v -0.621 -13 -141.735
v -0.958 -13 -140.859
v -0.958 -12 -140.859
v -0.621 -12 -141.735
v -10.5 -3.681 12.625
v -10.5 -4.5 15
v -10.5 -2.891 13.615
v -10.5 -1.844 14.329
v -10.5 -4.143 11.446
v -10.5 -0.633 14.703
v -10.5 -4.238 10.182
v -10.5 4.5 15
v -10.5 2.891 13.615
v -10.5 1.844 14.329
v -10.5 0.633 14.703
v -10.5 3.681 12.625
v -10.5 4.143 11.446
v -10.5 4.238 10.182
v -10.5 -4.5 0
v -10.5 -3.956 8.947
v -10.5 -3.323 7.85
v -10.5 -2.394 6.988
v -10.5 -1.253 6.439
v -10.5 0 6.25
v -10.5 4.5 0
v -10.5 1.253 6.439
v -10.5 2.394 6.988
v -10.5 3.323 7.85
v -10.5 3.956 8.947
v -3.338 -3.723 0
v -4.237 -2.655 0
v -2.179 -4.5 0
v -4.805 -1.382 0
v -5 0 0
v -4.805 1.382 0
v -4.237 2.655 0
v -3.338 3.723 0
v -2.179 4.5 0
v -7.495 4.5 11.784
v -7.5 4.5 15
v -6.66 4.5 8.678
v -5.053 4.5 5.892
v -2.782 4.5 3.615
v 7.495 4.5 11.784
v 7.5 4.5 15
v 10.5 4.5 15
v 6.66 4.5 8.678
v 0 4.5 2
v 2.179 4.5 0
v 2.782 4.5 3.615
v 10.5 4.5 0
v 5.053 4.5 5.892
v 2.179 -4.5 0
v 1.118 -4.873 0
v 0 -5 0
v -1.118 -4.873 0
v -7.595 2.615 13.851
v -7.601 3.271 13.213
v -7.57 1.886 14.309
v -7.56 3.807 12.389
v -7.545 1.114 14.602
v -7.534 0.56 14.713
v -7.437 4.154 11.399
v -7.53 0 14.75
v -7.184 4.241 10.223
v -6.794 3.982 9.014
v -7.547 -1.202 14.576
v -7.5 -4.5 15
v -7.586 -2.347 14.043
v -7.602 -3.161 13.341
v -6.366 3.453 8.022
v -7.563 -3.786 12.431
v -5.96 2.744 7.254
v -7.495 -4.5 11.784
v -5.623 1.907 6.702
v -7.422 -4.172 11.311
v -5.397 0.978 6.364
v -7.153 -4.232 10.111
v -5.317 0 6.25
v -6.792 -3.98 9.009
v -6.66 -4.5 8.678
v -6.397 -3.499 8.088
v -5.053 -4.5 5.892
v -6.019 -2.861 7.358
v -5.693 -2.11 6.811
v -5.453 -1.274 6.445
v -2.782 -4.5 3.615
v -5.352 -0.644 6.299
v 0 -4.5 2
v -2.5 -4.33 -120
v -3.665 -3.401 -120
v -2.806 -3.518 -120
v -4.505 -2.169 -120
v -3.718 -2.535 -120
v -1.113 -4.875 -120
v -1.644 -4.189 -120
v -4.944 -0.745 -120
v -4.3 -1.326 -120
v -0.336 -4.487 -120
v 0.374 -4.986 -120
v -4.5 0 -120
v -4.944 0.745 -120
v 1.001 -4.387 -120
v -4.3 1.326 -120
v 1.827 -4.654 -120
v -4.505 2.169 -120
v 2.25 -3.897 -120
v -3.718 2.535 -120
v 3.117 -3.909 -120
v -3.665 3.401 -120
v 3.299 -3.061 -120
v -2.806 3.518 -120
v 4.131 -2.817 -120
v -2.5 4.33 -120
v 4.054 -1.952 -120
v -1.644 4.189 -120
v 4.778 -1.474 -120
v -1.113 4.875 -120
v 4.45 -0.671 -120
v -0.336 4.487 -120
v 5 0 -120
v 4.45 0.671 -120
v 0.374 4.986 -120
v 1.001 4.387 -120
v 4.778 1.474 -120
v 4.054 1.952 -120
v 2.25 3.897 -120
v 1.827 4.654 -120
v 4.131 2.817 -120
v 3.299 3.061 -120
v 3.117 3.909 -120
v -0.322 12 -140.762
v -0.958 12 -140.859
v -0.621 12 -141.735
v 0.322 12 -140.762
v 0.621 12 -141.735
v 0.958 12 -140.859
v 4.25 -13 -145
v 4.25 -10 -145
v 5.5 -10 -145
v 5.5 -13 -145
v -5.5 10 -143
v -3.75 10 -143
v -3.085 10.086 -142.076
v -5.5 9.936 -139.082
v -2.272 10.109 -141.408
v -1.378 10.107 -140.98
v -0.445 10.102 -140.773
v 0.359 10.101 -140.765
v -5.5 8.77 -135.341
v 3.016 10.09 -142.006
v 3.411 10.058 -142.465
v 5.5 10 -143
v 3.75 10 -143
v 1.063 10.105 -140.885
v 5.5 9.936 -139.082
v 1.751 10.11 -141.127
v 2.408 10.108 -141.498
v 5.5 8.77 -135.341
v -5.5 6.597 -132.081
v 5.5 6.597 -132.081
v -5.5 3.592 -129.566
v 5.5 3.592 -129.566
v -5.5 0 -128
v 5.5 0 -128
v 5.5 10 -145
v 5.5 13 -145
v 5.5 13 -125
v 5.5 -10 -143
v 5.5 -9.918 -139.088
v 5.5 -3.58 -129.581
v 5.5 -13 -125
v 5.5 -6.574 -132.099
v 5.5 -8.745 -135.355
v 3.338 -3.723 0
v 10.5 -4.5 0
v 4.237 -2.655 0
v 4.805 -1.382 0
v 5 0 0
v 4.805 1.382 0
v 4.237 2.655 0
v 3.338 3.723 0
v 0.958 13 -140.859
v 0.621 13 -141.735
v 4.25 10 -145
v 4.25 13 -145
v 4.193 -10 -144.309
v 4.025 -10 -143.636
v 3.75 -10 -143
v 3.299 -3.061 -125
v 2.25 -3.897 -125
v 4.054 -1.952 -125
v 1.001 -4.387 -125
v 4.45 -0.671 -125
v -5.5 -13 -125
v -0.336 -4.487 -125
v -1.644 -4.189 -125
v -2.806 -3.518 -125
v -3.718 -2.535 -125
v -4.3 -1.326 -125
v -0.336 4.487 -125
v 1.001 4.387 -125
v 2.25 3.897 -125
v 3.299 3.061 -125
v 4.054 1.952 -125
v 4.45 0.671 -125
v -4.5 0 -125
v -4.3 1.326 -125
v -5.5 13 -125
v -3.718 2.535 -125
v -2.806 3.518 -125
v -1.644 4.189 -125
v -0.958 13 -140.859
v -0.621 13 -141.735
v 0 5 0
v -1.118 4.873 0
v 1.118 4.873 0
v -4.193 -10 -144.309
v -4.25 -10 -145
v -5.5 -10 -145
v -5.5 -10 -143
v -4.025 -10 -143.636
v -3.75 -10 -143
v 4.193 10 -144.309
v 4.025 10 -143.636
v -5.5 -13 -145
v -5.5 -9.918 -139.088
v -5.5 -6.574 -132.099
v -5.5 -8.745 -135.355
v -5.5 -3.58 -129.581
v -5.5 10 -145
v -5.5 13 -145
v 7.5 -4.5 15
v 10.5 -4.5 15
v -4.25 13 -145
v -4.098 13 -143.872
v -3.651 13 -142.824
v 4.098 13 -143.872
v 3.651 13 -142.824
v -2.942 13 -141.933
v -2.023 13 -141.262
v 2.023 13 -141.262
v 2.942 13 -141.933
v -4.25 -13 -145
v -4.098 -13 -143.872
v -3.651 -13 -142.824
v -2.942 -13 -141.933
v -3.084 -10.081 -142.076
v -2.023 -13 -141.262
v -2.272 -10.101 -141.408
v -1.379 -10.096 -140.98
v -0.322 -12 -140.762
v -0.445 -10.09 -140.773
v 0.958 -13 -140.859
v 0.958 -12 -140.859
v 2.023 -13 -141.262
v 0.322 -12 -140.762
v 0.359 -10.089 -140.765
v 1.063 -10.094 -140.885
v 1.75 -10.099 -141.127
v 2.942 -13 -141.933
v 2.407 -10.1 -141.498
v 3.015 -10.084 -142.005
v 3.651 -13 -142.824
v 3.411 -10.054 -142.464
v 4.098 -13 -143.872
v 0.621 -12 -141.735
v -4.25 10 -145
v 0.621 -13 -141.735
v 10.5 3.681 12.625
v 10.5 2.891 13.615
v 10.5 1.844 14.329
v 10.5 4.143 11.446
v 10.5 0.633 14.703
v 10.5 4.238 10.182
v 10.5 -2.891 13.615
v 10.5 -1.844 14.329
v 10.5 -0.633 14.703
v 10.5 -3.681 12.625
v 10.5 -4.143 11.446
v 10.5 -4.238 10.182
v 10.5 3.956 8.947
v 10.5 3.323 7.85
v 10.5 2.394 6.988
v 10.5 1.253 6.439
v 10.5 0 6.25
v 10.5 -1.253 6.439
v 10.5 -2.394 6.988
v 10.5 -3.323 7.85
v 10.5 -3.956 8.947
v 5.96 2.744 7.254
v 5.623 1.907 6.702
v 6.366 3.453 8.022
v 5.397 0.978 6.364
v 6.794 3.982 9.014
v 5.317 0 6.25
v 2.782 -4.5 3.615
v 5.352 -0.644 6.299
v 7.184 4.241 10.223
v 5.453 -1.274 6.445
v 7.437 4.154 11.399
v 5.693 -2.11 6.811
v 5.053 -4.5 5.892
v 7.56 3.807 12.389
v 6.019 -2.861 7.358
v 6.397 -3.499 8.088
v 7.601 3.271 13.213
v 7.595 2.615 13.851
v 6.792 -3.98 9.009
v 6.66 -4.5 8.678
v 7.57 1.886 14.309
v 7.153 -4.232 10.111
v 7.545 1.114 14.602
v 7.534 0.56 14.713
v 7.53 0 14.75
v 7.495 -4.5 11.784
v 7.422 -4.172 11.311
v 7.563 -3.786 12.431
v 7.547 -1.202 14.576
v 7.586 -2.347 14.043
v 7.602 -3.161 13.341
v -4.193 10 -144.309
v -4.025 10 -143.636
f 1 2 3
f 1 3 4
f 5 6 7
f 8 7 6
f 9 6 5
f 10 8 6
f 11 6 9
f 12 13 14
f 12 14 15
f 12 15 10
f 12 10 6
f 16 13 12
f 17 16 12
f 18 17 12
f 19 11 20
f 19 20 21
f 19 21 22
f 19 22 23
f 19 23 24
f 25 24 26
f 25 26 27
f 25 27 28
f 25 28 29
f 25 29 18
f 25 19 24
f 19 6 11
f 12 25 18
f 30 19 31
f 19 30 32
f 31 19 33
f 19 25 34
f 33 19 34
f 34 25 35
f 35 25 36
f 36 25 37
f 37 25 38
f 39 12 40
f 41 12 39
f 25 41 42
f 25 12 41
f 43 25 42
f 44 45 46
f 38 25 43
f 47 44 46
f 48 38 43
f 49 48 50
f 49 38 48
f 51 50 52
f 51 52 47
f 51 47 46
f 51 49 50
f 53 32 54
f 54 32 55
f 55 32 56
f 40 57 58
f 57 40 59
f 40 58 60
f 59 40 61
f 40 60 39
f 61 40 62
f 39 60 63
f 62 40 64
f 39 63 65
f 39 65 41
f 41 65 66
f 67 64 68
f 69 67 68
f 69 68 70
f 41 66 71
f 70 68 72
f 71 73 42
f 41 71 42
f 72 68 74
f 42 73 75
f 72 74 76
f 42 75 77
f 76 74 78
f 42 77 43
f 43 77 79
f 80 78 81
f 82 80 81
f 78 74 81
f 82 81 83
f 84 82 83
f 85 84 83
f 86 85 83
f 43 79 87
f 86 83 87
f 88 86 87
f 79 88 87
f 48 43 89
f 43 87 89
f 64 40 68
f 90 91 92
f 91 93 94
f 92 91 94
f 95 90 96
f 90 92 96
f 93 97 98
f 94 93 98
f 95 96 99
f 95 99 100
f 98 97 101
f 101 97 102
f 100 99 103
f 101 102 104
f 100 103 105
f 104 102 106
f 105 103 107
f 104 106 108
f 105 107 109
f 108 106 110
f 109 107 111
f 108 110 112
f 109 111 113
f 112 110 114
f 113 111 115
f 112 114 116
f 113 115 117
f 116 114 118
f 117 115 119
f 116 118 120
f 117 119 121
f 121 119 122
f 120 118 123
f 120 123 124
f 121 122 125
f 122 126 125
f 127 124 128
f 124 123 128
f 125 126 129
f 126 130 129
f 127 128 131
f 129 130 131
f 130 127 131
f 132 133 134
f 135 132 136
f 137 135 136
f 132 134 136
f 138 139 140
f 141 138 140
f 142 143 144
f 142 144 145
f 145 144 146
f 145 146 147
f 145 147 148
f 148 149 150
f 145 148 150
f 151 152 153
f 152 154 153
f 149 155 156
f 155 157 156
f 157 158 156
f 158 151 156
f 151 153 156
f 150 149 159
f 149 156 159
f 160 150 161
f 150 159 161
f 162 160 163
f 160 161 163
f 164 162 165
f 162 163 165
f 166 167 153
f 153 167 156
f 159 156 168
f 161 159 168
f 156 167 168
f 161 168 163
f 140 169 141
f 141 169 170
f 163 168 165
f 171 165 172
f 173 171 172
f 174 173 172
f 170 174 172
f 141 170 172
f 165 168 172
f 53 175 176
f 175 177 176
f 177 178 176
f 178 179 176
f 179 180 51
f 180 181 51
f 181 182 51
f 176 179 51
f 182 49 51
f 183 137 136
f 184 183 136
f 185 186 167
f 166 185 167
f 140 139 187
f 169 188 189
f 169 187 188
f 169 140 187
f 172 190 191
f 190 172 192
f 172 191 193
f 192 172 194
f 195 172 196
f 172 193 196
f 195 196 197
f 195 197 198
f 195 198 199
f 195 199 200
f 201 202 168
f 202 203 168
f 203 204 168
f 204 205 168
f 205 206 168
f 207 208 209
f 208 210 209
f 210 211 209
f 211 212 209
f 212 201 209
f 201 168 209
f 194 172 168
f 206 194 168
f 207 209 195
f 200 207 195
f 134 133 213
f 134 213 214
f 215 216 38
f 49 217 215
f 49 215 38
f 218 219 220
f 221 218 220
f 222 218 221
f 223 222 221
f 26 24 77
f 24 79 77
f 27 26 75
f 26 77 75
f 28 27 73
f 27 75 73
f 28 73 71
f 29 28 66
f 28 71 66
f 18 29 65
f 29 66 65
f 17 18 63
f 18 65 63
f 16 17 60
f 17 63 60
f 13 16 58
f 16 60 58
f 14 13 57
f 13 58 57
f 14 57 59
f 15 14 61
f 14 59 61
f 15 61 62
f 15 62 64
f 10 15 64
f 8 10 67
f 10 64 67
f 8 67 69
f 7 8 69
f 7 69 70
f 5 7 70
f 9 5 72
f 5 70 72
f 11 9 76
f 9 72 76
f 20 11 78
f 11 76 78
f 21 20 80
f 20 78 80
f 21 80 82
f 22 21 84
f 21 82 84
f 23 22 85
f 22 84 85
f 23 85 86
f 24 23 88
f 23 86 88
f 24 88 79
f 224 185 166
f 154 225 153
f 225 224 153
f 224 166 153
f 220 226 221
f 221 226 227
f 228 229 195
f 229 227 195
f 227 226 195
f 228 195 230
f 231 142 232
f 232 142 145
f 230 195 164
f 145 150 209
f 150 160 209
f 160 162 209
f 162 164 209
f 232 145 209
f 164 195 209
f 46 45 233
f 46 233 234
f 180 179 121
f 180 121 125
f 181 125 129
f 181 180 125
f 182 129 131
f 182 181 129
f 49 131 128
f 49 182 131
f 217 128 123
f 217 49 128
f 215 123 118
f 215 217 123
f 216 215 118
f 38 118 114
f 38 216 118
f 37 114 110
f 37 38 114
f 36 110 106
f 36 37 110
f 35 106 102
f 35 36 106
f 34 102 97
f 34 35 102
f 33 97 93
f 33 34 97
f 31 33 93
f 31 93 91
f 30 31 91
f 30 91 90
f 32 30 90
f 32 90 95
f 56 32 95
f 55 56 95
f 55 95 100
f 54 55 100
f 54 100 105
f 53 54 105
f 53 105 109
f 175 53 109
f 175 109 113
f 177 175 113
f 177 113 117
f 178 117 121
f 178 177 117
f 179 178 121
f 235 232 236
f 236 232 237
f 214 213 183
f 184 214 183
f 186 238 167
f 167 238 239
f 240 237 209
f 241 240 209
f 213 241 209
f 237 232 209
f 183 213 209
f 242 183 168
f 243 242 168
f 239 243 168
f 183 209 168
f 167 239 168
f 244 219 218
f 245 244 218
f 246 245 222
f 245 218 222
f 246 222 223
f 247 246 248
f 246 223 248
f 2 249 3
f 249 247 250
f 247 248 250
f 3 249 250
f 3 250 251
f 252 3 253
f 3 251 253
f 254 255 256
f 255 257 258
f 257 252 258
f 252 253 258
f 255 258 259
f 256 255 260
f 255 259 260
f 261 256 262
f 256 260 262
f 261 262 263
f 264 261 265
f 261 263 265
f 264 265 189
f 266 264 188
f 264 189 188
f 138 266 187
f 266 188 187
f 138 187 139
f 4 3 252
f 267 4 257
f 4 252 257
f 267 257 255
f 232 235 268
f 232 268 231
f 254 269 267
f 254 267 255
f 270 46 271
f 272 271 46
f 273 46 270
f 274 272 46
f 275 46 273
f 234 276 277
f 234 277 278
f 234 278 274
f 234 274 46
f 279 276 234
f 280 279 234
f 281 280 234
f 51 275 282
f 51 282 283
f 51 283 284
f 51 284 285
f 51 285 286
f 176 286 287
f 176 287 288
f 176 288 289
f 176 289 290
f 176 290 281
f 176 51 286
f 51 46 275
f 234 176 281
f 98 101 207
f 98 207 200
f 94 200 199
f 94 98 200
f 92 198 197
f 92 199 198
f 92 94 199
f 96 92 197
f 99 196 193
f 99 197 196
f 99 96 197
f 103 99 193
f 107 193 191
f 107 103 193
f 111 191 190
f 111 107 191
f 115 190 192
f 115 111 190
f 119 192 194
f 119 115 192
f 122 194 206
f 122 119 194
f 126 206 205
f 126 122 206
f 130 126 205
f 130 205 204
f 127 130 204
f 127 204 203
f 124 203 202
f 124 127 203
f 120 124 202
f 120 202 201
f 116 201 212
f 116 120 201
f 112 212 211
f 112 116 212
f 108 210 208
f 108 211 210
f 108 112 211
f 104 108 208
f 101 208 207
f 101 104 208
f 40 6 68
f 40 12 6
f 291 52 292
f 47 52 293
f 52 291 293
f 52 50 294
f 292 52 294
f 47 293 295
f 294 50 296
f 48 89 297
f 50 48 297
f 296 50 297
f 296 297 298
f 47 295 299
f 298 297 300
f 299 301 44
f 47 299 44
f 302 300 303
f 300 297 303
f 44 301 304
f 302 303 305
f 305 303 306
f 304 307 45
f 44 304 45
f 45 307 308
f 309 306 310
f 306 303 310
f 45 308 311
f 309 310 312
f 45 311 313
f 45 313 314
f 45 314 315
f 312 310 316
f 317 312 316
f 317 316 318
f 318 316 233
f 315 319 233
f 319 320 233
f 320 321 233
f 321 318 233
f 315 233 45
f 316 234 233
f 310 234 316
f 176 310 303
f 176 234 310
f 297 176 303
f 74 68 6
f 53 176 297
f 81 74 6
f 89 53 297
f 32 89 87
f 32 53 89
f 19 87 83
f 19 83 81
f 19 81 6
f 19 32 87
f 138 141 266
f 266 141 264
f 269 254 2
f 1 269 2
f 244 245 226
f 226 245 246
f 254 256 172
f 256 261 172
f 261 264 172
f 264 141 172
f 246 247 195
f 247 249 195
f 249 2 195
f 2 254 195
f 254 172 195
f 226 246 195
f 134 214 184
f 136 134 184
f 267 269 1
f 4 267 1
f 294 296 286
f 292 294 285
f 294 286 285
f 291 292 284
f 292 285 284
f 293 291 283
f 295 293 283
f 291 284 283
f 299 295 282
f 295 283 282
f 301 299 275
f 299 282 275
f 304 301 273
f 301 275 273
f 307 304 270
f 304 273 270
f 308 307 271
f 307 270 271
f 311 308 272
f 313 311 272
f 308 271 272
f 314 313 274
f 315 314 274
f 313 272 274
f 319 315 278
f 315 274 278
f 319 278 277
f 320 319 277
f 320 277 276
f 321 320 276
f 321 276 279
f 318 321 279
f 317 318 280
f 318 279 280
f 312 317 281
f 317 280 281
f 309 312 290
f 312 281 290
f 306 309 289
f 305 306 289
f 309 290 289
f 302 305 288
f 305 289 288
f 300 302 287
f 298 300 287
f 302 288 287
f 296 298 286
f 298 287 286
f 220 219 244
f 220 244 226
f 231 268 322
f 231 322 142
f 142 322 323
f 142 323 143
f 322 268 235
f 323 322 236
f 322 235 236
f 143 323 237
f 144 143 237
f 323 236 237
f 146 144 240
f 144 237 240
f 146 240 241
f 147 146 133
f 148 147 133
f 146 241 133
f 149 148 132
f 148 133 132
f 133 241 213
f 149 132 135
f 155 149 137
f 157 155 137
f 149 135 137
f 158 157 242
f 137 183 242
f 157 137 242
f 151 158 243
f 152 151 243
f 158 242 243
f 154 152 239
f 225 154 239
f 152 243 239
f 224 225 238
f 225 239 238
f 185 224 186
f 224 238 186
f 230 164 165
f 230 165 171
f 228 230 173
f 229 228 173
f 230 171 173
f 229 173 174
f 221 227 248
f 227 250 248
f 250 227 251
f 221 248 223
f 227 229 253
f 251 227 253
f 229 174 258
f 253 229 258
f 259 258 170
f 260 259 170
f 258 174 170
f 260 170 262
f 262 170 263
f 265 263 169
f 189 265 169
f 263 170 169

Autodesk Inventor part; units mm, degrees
ref_plane "YZ Plane" through (0, 0, 0) normal (1, 0, 0) x (0, 1, 0)
ref_plane "XZ Plane" through (0, 0, 0) normal (0, 1, 0) x (-1, 0, 0)
ref_plane "XY Plane" through (0, 0, 0) normal (0, 0, 1) x (1, 0, 0)
sketch "Sketch1" plane through (0, 0, 0) normal (0, 0, 1) x (1, 0, 0)
  circle A0 centre (0, 0) radius 5
  dimension "d0" = 10
extrude "Extrusion1" add sketch "Sketch1" against normal blind 120
sketch "Sketch2" plane through (0, 0, -120) normal (0, 0, -1) x (-1, 0, 0)
  circle A0 centre (0, 0) radius 4.5
  dimension "d3" = 9
extrude "Extrusion2" add sketch "Sketch2" along normal blind 5
sketch "Sketch3" plane through (0, 0, 0) normal (0, 0, 1) x (1, 0, 0)
  circle A0 centre (0, 0) radius 5 projected
  line L0 (0, 0) -> (10, 0)
  line L1 (10, 0) -> (-10.5, 0)
  line L2 (0, 0) -> (0, 4.5)
  line L3 (0, 4.5) -> (0, -4.5)
  line L4 (0, -4.5) -> (-10.5, -4.5)
  line L5 (-10.5, -4.5) -> (-10.5, 0)
  line L6 (-10.5, 0) -> (-10.5, 4.5)
  line L7 (-10.5, 4.5) -> (0, 4.5)
  line L8 (0, 4.5) -> (10.5, 4.5)
  line L9 (10.5, 4.5) -> (10.5, -4.5)
  line L10 (10.5, -4.5) -> (0, -4.5)
  dimension "d8" = 4.5
  dimension "d50" = 10.5
  dimension "d52" = 10.5
  dimension "d53" = 4.5
extrude "Extrusion3" add sketch "Sketch3" along normal blind 15 contours L0 L2 L8 A0 | A0 L8 L9 L10 | A0 L10 L3 L0 | L3 L4 A0 L1 | L1 A0 L7 L2 | A0 L1 L6 L7 | L4 L5 L1 A0
sketch "Sketch4" plane through (-10.5, -4.5, 0) normal (0, -1, 0) x (1, 0, 0)
  line L0 (0, 0) -> (8.3206, 0) projected
  line L1 (12.6794, 0) -> (8.3206, 0) projected
  line L2 (12.6794, 0) -> (21, 0) projected
  line L3 (21, 0) -> (21, 15) projected
  line L4 (0, 15) -> (21, 15) projected
  line L5 (0, 0) -> (0, 15) projected
  line L6 (10.5, 0) -> (10.5, 2)
  line L7 (0, 15) -> (21, 15) projected
  line L8 (0, 15) -> (3, 15)
  line L9 (21, 15) -> (18, 15)
  arc A0 (3, 15) -> (10.5, 2) centre (15.2653, 13.4127) ccw
  line L10 (10.5, 2) -> (10.5, 15)
  line L11 (4.5527, 7.2323) -> (0, 7.2323)
  line L12 (0, 0) -> (0, 15) projected
  line L13 (4.5527, 7.2323) -> (4.5527, 0)
  line L14 (16.4473, 7.2323) -> (21, 7.2323)
  line L15 (16.4473, 7.2323) -> (16.4473, 0)
  arc A1 (10.5, 2) -> (18, 15) centre (5.7347, 13.4127) ccw
  dimension "d12" = 2
  dimension "d13" = 3
  dimension "d14" = 3
extrude "Extrusion4" cut sketch "Sketch4" against normal blind 15 contours A0 L4 L10 | L10 L4 A1
sketch "Sketch5" plane through (10.5, -4.5, 0) normal (1, 0, 0) x (0, 0, -1)
  line L0 (0, 0) -> (0, 9) projected
  line L1 (0, 9) -> (-15, 9) projected
  line L2 (-15, 0) -> (-15, 9) projected
  line L3 (0, 0) -> (-15, 0) projected
  line L4 (-15, 0) -> (-15, 9) projected
  line L5 (-15, 4.5) -> (-10.5, 4.5)
  line L6 (0, 9) -> (0, 0) projected
  circle A0 centre (-10.5, 4.5) radius 4.25
  point P0 (0, 4.5)
  dimension "d19" = 4.5
  dimension "d20" = 8.5
extrude "Extrusion5" cut sketch "Sketch5" against normal blind 37.25 contours A0
sketch "Sketch6" plane through (0, 0, -125) normal (0, 0, -1) x (-1, 0, 0)
  circle A0 centre (0, 0) radius 4.5 projected
  line L0 (0, 0) -> (0, 13)
  line L1 (0, -4.5) -> (0, 4.5) projected
  line L2 (0, 13) -> (0, -13)
  line L3 (0, -13) -> (-5.5, -13)
  line L4 (-5.5, -13) -> (5.5, -13)
  line L5 (5.5, -13) -> (5.5, 13)
  line L6 (5.5, 13) -> (-5.5, 13)
  line L7 (-5.5, 13) -> (-5.5, -13)
  dimension "d23" = 13
  dimension "d24" = 26
  dimension "d25" = 5.5
  dimension "d26" = 11
extrude "Extrusion6" add sketch "Sketch6" along normal blind 25
sketch "Sketch7" plane through (5.5, -13, -125) normal (1, 0, 0) x (0, 0, -1)
  line L0 (0, 26) -> (0, 0) projected
  line L1 (0, 0) -> (25, 0) projected
  line L2 (25, 26) -> (25, 0) projected
  line L3 (0, 26) -> (25, 26) projected
  line L4 (25, 26) -> (25, 0) projected
  line L5 (25, 26) -> (25, 23)
  line L6 (25, 0) -> (25, 3)
  line L7 (25, 23) -> (18, 23)
  line L8 (0, 8.5) -> (0, 17.5) projected
  line L9 (0, 13) -> (3, 13)
  arc A0 (18, 23) -> (3, 13) centre (16.2622, 9.3566) ccw
  line L10 (25, 3) -> (18, 3)
  line L11 (18, 3) -> (18, 23)
  arc A1 (3, 13) -> (18, 3) centre (16.3321, 16.7481) ccw
  point P0 (-125, 13)
  dimension "d29" = 3
  dimension "d30" = 3
  dimension "d32" = 7
  dimension "d33" = 3
extrude "Extrusion7" cut sketch "Sketch7" against normal blind 25 contours L2 L10 L11 L7 | A0 L11 A1
sketch "Sketch8" plane through (-5.5, 13, -125) normal (0, 1, 0) x (1, 0, 0)
  line L0 (0, 0) -> (11, 0) projected
  line L1 (11, 0) -> (11, 25) projected
  line L2 (0, 25) -> (11, 25) projected
  line L3 (0, 0) -> (0, 25) projected
  line L4 (5.5, 25) -> (5.5, 20)
  circle A0 centre (5.5, 20) radius 4.25
  line L5 (1.25, 20) -> (0, 20)
  line L6 (0, 18) -> (0, 25) projected
  line L7 (9.75, 20) -> (11, 20)
  line L8 (11, 25) -> (11, 18) projected
  point P0 (5.5, -125)
  dimension "d36" = 5
  dimension "d37" = 8.5
extrude "Extrusion8" cut sketch "Sketch8" against normal blind 30 contours L3 L2 L4 A0 L5 | L7 A0 L4 L2 L1 | A0
sketch "Sketch9" plane through (-5.5, 13, -125) normal (0, 1, 0) x (1, 0, 0)
  line L0 (1.25, 20) -> (0, 20) projected
  line L1 (0, 0) -> (0, 20) projected
  line L2 (0, 0) -> (11, 0) projected
  line L3 (11, 0) -> (11, 20) projected
  line L4 (11, 20) -> (9.75, 20) projected
  arc A0 (1.25, 20) -> (9.75, 20) centre (5.5, 20) ccw projected
  arc A1 (1.25, 20) -> (9.75, 20) centre (5.5, 20) ccw projected
  line L5 (5.5, 15.75) -> (5, 15.75)
  line L6 (5, 15.75) -> (4.5, 15.75)
  line L7 (4.5, 15.75) -> (6.5, 15.75)
  line L8 (6.5, 15.75) -> (6.1213, 16.7351)
  line L9 (6.1213, 16.7351) -> (5.5, 16.7351)
  line L10 (5.5, 16.7351) -> (5.5, 15.75)
  line L11 (4.5, 15.75) -> (4.8787, 16.7351)
  line L12 (4.8787, 16.7351) -> (5.5, 16.7351)
  line L13 (0, 20) -> (1.25, 20) projected
  arc A2 (1.25, 20) -> (9.75, 20) centre (5.5, 20) ccw projected
  line L14 (9.75, 20) -> (11, 20) projected
  line L15 (11, 0) -> (11, 20) projected
  line L16 (11, 0) -> (0, 0) projected
  line L17 (0, 0) -> (0, 20) projected
  point P0 (5.5, -125)
  point P1 (4.5421, 15.8594)
  point P2 (6.4579, 15.8594)
  dimension "d40" = 0.5
  dimension "d41" = 0.5
  dimension "d42" = 2
extrude "Extrusion9" add sketch "Sketch9" against normal blind 1 contours L11 L12 L10 A0 | L10 L9 L8 A0
sketch "Sketch10" plane through (-5.5, -13, -125) normal (0, -1, 0) x (1, 0, 0)
  line L0 (0, -20) -> (1.25, -20) projected
  arc A0 (9.75, -20) -> (1.25, -20) centre (5.5, -20) ccw projected
  line L1 (9.75, -20) -> (11, -20) projected
  line L2 (11, 0) -> (11, -20) projected
  line L3 (11, 0) -> (0, 0) projected
  line L4 (0, 0) -> (0, -20) projected
  arc A1 (6.4579, -15.8594) -> (4.5421, -15.8594) centre (5.5, -20) ccw projected
  line L5 (5.5, -15.75) -> (4.5, -15.75)
  line L6 (4.5, -15.75) -> (6.5, -15.75)
  line L7 (6.1213, -16.7351) -> (6.4579, -15.8594) projected
  line L8 (6.5, -15.75) -> (6.1213, -16.7351)
  line L9 (4.5421, -15.8594) -> (4.8787, -16.7351) projected
  line L10 (6.1213, -16.7351) -> (4.8787, -16.7351)
  line L11 (4.8787, -16.7351) -> (4.5, -15.75)
  point P0 (5.5, 125)
  dimension "d45" = 1
  dimension "d46" = 2
extrude "Extrusion10" add sketch "Sketch10" against normal blind 1 contours A0 L7 L10 L9
